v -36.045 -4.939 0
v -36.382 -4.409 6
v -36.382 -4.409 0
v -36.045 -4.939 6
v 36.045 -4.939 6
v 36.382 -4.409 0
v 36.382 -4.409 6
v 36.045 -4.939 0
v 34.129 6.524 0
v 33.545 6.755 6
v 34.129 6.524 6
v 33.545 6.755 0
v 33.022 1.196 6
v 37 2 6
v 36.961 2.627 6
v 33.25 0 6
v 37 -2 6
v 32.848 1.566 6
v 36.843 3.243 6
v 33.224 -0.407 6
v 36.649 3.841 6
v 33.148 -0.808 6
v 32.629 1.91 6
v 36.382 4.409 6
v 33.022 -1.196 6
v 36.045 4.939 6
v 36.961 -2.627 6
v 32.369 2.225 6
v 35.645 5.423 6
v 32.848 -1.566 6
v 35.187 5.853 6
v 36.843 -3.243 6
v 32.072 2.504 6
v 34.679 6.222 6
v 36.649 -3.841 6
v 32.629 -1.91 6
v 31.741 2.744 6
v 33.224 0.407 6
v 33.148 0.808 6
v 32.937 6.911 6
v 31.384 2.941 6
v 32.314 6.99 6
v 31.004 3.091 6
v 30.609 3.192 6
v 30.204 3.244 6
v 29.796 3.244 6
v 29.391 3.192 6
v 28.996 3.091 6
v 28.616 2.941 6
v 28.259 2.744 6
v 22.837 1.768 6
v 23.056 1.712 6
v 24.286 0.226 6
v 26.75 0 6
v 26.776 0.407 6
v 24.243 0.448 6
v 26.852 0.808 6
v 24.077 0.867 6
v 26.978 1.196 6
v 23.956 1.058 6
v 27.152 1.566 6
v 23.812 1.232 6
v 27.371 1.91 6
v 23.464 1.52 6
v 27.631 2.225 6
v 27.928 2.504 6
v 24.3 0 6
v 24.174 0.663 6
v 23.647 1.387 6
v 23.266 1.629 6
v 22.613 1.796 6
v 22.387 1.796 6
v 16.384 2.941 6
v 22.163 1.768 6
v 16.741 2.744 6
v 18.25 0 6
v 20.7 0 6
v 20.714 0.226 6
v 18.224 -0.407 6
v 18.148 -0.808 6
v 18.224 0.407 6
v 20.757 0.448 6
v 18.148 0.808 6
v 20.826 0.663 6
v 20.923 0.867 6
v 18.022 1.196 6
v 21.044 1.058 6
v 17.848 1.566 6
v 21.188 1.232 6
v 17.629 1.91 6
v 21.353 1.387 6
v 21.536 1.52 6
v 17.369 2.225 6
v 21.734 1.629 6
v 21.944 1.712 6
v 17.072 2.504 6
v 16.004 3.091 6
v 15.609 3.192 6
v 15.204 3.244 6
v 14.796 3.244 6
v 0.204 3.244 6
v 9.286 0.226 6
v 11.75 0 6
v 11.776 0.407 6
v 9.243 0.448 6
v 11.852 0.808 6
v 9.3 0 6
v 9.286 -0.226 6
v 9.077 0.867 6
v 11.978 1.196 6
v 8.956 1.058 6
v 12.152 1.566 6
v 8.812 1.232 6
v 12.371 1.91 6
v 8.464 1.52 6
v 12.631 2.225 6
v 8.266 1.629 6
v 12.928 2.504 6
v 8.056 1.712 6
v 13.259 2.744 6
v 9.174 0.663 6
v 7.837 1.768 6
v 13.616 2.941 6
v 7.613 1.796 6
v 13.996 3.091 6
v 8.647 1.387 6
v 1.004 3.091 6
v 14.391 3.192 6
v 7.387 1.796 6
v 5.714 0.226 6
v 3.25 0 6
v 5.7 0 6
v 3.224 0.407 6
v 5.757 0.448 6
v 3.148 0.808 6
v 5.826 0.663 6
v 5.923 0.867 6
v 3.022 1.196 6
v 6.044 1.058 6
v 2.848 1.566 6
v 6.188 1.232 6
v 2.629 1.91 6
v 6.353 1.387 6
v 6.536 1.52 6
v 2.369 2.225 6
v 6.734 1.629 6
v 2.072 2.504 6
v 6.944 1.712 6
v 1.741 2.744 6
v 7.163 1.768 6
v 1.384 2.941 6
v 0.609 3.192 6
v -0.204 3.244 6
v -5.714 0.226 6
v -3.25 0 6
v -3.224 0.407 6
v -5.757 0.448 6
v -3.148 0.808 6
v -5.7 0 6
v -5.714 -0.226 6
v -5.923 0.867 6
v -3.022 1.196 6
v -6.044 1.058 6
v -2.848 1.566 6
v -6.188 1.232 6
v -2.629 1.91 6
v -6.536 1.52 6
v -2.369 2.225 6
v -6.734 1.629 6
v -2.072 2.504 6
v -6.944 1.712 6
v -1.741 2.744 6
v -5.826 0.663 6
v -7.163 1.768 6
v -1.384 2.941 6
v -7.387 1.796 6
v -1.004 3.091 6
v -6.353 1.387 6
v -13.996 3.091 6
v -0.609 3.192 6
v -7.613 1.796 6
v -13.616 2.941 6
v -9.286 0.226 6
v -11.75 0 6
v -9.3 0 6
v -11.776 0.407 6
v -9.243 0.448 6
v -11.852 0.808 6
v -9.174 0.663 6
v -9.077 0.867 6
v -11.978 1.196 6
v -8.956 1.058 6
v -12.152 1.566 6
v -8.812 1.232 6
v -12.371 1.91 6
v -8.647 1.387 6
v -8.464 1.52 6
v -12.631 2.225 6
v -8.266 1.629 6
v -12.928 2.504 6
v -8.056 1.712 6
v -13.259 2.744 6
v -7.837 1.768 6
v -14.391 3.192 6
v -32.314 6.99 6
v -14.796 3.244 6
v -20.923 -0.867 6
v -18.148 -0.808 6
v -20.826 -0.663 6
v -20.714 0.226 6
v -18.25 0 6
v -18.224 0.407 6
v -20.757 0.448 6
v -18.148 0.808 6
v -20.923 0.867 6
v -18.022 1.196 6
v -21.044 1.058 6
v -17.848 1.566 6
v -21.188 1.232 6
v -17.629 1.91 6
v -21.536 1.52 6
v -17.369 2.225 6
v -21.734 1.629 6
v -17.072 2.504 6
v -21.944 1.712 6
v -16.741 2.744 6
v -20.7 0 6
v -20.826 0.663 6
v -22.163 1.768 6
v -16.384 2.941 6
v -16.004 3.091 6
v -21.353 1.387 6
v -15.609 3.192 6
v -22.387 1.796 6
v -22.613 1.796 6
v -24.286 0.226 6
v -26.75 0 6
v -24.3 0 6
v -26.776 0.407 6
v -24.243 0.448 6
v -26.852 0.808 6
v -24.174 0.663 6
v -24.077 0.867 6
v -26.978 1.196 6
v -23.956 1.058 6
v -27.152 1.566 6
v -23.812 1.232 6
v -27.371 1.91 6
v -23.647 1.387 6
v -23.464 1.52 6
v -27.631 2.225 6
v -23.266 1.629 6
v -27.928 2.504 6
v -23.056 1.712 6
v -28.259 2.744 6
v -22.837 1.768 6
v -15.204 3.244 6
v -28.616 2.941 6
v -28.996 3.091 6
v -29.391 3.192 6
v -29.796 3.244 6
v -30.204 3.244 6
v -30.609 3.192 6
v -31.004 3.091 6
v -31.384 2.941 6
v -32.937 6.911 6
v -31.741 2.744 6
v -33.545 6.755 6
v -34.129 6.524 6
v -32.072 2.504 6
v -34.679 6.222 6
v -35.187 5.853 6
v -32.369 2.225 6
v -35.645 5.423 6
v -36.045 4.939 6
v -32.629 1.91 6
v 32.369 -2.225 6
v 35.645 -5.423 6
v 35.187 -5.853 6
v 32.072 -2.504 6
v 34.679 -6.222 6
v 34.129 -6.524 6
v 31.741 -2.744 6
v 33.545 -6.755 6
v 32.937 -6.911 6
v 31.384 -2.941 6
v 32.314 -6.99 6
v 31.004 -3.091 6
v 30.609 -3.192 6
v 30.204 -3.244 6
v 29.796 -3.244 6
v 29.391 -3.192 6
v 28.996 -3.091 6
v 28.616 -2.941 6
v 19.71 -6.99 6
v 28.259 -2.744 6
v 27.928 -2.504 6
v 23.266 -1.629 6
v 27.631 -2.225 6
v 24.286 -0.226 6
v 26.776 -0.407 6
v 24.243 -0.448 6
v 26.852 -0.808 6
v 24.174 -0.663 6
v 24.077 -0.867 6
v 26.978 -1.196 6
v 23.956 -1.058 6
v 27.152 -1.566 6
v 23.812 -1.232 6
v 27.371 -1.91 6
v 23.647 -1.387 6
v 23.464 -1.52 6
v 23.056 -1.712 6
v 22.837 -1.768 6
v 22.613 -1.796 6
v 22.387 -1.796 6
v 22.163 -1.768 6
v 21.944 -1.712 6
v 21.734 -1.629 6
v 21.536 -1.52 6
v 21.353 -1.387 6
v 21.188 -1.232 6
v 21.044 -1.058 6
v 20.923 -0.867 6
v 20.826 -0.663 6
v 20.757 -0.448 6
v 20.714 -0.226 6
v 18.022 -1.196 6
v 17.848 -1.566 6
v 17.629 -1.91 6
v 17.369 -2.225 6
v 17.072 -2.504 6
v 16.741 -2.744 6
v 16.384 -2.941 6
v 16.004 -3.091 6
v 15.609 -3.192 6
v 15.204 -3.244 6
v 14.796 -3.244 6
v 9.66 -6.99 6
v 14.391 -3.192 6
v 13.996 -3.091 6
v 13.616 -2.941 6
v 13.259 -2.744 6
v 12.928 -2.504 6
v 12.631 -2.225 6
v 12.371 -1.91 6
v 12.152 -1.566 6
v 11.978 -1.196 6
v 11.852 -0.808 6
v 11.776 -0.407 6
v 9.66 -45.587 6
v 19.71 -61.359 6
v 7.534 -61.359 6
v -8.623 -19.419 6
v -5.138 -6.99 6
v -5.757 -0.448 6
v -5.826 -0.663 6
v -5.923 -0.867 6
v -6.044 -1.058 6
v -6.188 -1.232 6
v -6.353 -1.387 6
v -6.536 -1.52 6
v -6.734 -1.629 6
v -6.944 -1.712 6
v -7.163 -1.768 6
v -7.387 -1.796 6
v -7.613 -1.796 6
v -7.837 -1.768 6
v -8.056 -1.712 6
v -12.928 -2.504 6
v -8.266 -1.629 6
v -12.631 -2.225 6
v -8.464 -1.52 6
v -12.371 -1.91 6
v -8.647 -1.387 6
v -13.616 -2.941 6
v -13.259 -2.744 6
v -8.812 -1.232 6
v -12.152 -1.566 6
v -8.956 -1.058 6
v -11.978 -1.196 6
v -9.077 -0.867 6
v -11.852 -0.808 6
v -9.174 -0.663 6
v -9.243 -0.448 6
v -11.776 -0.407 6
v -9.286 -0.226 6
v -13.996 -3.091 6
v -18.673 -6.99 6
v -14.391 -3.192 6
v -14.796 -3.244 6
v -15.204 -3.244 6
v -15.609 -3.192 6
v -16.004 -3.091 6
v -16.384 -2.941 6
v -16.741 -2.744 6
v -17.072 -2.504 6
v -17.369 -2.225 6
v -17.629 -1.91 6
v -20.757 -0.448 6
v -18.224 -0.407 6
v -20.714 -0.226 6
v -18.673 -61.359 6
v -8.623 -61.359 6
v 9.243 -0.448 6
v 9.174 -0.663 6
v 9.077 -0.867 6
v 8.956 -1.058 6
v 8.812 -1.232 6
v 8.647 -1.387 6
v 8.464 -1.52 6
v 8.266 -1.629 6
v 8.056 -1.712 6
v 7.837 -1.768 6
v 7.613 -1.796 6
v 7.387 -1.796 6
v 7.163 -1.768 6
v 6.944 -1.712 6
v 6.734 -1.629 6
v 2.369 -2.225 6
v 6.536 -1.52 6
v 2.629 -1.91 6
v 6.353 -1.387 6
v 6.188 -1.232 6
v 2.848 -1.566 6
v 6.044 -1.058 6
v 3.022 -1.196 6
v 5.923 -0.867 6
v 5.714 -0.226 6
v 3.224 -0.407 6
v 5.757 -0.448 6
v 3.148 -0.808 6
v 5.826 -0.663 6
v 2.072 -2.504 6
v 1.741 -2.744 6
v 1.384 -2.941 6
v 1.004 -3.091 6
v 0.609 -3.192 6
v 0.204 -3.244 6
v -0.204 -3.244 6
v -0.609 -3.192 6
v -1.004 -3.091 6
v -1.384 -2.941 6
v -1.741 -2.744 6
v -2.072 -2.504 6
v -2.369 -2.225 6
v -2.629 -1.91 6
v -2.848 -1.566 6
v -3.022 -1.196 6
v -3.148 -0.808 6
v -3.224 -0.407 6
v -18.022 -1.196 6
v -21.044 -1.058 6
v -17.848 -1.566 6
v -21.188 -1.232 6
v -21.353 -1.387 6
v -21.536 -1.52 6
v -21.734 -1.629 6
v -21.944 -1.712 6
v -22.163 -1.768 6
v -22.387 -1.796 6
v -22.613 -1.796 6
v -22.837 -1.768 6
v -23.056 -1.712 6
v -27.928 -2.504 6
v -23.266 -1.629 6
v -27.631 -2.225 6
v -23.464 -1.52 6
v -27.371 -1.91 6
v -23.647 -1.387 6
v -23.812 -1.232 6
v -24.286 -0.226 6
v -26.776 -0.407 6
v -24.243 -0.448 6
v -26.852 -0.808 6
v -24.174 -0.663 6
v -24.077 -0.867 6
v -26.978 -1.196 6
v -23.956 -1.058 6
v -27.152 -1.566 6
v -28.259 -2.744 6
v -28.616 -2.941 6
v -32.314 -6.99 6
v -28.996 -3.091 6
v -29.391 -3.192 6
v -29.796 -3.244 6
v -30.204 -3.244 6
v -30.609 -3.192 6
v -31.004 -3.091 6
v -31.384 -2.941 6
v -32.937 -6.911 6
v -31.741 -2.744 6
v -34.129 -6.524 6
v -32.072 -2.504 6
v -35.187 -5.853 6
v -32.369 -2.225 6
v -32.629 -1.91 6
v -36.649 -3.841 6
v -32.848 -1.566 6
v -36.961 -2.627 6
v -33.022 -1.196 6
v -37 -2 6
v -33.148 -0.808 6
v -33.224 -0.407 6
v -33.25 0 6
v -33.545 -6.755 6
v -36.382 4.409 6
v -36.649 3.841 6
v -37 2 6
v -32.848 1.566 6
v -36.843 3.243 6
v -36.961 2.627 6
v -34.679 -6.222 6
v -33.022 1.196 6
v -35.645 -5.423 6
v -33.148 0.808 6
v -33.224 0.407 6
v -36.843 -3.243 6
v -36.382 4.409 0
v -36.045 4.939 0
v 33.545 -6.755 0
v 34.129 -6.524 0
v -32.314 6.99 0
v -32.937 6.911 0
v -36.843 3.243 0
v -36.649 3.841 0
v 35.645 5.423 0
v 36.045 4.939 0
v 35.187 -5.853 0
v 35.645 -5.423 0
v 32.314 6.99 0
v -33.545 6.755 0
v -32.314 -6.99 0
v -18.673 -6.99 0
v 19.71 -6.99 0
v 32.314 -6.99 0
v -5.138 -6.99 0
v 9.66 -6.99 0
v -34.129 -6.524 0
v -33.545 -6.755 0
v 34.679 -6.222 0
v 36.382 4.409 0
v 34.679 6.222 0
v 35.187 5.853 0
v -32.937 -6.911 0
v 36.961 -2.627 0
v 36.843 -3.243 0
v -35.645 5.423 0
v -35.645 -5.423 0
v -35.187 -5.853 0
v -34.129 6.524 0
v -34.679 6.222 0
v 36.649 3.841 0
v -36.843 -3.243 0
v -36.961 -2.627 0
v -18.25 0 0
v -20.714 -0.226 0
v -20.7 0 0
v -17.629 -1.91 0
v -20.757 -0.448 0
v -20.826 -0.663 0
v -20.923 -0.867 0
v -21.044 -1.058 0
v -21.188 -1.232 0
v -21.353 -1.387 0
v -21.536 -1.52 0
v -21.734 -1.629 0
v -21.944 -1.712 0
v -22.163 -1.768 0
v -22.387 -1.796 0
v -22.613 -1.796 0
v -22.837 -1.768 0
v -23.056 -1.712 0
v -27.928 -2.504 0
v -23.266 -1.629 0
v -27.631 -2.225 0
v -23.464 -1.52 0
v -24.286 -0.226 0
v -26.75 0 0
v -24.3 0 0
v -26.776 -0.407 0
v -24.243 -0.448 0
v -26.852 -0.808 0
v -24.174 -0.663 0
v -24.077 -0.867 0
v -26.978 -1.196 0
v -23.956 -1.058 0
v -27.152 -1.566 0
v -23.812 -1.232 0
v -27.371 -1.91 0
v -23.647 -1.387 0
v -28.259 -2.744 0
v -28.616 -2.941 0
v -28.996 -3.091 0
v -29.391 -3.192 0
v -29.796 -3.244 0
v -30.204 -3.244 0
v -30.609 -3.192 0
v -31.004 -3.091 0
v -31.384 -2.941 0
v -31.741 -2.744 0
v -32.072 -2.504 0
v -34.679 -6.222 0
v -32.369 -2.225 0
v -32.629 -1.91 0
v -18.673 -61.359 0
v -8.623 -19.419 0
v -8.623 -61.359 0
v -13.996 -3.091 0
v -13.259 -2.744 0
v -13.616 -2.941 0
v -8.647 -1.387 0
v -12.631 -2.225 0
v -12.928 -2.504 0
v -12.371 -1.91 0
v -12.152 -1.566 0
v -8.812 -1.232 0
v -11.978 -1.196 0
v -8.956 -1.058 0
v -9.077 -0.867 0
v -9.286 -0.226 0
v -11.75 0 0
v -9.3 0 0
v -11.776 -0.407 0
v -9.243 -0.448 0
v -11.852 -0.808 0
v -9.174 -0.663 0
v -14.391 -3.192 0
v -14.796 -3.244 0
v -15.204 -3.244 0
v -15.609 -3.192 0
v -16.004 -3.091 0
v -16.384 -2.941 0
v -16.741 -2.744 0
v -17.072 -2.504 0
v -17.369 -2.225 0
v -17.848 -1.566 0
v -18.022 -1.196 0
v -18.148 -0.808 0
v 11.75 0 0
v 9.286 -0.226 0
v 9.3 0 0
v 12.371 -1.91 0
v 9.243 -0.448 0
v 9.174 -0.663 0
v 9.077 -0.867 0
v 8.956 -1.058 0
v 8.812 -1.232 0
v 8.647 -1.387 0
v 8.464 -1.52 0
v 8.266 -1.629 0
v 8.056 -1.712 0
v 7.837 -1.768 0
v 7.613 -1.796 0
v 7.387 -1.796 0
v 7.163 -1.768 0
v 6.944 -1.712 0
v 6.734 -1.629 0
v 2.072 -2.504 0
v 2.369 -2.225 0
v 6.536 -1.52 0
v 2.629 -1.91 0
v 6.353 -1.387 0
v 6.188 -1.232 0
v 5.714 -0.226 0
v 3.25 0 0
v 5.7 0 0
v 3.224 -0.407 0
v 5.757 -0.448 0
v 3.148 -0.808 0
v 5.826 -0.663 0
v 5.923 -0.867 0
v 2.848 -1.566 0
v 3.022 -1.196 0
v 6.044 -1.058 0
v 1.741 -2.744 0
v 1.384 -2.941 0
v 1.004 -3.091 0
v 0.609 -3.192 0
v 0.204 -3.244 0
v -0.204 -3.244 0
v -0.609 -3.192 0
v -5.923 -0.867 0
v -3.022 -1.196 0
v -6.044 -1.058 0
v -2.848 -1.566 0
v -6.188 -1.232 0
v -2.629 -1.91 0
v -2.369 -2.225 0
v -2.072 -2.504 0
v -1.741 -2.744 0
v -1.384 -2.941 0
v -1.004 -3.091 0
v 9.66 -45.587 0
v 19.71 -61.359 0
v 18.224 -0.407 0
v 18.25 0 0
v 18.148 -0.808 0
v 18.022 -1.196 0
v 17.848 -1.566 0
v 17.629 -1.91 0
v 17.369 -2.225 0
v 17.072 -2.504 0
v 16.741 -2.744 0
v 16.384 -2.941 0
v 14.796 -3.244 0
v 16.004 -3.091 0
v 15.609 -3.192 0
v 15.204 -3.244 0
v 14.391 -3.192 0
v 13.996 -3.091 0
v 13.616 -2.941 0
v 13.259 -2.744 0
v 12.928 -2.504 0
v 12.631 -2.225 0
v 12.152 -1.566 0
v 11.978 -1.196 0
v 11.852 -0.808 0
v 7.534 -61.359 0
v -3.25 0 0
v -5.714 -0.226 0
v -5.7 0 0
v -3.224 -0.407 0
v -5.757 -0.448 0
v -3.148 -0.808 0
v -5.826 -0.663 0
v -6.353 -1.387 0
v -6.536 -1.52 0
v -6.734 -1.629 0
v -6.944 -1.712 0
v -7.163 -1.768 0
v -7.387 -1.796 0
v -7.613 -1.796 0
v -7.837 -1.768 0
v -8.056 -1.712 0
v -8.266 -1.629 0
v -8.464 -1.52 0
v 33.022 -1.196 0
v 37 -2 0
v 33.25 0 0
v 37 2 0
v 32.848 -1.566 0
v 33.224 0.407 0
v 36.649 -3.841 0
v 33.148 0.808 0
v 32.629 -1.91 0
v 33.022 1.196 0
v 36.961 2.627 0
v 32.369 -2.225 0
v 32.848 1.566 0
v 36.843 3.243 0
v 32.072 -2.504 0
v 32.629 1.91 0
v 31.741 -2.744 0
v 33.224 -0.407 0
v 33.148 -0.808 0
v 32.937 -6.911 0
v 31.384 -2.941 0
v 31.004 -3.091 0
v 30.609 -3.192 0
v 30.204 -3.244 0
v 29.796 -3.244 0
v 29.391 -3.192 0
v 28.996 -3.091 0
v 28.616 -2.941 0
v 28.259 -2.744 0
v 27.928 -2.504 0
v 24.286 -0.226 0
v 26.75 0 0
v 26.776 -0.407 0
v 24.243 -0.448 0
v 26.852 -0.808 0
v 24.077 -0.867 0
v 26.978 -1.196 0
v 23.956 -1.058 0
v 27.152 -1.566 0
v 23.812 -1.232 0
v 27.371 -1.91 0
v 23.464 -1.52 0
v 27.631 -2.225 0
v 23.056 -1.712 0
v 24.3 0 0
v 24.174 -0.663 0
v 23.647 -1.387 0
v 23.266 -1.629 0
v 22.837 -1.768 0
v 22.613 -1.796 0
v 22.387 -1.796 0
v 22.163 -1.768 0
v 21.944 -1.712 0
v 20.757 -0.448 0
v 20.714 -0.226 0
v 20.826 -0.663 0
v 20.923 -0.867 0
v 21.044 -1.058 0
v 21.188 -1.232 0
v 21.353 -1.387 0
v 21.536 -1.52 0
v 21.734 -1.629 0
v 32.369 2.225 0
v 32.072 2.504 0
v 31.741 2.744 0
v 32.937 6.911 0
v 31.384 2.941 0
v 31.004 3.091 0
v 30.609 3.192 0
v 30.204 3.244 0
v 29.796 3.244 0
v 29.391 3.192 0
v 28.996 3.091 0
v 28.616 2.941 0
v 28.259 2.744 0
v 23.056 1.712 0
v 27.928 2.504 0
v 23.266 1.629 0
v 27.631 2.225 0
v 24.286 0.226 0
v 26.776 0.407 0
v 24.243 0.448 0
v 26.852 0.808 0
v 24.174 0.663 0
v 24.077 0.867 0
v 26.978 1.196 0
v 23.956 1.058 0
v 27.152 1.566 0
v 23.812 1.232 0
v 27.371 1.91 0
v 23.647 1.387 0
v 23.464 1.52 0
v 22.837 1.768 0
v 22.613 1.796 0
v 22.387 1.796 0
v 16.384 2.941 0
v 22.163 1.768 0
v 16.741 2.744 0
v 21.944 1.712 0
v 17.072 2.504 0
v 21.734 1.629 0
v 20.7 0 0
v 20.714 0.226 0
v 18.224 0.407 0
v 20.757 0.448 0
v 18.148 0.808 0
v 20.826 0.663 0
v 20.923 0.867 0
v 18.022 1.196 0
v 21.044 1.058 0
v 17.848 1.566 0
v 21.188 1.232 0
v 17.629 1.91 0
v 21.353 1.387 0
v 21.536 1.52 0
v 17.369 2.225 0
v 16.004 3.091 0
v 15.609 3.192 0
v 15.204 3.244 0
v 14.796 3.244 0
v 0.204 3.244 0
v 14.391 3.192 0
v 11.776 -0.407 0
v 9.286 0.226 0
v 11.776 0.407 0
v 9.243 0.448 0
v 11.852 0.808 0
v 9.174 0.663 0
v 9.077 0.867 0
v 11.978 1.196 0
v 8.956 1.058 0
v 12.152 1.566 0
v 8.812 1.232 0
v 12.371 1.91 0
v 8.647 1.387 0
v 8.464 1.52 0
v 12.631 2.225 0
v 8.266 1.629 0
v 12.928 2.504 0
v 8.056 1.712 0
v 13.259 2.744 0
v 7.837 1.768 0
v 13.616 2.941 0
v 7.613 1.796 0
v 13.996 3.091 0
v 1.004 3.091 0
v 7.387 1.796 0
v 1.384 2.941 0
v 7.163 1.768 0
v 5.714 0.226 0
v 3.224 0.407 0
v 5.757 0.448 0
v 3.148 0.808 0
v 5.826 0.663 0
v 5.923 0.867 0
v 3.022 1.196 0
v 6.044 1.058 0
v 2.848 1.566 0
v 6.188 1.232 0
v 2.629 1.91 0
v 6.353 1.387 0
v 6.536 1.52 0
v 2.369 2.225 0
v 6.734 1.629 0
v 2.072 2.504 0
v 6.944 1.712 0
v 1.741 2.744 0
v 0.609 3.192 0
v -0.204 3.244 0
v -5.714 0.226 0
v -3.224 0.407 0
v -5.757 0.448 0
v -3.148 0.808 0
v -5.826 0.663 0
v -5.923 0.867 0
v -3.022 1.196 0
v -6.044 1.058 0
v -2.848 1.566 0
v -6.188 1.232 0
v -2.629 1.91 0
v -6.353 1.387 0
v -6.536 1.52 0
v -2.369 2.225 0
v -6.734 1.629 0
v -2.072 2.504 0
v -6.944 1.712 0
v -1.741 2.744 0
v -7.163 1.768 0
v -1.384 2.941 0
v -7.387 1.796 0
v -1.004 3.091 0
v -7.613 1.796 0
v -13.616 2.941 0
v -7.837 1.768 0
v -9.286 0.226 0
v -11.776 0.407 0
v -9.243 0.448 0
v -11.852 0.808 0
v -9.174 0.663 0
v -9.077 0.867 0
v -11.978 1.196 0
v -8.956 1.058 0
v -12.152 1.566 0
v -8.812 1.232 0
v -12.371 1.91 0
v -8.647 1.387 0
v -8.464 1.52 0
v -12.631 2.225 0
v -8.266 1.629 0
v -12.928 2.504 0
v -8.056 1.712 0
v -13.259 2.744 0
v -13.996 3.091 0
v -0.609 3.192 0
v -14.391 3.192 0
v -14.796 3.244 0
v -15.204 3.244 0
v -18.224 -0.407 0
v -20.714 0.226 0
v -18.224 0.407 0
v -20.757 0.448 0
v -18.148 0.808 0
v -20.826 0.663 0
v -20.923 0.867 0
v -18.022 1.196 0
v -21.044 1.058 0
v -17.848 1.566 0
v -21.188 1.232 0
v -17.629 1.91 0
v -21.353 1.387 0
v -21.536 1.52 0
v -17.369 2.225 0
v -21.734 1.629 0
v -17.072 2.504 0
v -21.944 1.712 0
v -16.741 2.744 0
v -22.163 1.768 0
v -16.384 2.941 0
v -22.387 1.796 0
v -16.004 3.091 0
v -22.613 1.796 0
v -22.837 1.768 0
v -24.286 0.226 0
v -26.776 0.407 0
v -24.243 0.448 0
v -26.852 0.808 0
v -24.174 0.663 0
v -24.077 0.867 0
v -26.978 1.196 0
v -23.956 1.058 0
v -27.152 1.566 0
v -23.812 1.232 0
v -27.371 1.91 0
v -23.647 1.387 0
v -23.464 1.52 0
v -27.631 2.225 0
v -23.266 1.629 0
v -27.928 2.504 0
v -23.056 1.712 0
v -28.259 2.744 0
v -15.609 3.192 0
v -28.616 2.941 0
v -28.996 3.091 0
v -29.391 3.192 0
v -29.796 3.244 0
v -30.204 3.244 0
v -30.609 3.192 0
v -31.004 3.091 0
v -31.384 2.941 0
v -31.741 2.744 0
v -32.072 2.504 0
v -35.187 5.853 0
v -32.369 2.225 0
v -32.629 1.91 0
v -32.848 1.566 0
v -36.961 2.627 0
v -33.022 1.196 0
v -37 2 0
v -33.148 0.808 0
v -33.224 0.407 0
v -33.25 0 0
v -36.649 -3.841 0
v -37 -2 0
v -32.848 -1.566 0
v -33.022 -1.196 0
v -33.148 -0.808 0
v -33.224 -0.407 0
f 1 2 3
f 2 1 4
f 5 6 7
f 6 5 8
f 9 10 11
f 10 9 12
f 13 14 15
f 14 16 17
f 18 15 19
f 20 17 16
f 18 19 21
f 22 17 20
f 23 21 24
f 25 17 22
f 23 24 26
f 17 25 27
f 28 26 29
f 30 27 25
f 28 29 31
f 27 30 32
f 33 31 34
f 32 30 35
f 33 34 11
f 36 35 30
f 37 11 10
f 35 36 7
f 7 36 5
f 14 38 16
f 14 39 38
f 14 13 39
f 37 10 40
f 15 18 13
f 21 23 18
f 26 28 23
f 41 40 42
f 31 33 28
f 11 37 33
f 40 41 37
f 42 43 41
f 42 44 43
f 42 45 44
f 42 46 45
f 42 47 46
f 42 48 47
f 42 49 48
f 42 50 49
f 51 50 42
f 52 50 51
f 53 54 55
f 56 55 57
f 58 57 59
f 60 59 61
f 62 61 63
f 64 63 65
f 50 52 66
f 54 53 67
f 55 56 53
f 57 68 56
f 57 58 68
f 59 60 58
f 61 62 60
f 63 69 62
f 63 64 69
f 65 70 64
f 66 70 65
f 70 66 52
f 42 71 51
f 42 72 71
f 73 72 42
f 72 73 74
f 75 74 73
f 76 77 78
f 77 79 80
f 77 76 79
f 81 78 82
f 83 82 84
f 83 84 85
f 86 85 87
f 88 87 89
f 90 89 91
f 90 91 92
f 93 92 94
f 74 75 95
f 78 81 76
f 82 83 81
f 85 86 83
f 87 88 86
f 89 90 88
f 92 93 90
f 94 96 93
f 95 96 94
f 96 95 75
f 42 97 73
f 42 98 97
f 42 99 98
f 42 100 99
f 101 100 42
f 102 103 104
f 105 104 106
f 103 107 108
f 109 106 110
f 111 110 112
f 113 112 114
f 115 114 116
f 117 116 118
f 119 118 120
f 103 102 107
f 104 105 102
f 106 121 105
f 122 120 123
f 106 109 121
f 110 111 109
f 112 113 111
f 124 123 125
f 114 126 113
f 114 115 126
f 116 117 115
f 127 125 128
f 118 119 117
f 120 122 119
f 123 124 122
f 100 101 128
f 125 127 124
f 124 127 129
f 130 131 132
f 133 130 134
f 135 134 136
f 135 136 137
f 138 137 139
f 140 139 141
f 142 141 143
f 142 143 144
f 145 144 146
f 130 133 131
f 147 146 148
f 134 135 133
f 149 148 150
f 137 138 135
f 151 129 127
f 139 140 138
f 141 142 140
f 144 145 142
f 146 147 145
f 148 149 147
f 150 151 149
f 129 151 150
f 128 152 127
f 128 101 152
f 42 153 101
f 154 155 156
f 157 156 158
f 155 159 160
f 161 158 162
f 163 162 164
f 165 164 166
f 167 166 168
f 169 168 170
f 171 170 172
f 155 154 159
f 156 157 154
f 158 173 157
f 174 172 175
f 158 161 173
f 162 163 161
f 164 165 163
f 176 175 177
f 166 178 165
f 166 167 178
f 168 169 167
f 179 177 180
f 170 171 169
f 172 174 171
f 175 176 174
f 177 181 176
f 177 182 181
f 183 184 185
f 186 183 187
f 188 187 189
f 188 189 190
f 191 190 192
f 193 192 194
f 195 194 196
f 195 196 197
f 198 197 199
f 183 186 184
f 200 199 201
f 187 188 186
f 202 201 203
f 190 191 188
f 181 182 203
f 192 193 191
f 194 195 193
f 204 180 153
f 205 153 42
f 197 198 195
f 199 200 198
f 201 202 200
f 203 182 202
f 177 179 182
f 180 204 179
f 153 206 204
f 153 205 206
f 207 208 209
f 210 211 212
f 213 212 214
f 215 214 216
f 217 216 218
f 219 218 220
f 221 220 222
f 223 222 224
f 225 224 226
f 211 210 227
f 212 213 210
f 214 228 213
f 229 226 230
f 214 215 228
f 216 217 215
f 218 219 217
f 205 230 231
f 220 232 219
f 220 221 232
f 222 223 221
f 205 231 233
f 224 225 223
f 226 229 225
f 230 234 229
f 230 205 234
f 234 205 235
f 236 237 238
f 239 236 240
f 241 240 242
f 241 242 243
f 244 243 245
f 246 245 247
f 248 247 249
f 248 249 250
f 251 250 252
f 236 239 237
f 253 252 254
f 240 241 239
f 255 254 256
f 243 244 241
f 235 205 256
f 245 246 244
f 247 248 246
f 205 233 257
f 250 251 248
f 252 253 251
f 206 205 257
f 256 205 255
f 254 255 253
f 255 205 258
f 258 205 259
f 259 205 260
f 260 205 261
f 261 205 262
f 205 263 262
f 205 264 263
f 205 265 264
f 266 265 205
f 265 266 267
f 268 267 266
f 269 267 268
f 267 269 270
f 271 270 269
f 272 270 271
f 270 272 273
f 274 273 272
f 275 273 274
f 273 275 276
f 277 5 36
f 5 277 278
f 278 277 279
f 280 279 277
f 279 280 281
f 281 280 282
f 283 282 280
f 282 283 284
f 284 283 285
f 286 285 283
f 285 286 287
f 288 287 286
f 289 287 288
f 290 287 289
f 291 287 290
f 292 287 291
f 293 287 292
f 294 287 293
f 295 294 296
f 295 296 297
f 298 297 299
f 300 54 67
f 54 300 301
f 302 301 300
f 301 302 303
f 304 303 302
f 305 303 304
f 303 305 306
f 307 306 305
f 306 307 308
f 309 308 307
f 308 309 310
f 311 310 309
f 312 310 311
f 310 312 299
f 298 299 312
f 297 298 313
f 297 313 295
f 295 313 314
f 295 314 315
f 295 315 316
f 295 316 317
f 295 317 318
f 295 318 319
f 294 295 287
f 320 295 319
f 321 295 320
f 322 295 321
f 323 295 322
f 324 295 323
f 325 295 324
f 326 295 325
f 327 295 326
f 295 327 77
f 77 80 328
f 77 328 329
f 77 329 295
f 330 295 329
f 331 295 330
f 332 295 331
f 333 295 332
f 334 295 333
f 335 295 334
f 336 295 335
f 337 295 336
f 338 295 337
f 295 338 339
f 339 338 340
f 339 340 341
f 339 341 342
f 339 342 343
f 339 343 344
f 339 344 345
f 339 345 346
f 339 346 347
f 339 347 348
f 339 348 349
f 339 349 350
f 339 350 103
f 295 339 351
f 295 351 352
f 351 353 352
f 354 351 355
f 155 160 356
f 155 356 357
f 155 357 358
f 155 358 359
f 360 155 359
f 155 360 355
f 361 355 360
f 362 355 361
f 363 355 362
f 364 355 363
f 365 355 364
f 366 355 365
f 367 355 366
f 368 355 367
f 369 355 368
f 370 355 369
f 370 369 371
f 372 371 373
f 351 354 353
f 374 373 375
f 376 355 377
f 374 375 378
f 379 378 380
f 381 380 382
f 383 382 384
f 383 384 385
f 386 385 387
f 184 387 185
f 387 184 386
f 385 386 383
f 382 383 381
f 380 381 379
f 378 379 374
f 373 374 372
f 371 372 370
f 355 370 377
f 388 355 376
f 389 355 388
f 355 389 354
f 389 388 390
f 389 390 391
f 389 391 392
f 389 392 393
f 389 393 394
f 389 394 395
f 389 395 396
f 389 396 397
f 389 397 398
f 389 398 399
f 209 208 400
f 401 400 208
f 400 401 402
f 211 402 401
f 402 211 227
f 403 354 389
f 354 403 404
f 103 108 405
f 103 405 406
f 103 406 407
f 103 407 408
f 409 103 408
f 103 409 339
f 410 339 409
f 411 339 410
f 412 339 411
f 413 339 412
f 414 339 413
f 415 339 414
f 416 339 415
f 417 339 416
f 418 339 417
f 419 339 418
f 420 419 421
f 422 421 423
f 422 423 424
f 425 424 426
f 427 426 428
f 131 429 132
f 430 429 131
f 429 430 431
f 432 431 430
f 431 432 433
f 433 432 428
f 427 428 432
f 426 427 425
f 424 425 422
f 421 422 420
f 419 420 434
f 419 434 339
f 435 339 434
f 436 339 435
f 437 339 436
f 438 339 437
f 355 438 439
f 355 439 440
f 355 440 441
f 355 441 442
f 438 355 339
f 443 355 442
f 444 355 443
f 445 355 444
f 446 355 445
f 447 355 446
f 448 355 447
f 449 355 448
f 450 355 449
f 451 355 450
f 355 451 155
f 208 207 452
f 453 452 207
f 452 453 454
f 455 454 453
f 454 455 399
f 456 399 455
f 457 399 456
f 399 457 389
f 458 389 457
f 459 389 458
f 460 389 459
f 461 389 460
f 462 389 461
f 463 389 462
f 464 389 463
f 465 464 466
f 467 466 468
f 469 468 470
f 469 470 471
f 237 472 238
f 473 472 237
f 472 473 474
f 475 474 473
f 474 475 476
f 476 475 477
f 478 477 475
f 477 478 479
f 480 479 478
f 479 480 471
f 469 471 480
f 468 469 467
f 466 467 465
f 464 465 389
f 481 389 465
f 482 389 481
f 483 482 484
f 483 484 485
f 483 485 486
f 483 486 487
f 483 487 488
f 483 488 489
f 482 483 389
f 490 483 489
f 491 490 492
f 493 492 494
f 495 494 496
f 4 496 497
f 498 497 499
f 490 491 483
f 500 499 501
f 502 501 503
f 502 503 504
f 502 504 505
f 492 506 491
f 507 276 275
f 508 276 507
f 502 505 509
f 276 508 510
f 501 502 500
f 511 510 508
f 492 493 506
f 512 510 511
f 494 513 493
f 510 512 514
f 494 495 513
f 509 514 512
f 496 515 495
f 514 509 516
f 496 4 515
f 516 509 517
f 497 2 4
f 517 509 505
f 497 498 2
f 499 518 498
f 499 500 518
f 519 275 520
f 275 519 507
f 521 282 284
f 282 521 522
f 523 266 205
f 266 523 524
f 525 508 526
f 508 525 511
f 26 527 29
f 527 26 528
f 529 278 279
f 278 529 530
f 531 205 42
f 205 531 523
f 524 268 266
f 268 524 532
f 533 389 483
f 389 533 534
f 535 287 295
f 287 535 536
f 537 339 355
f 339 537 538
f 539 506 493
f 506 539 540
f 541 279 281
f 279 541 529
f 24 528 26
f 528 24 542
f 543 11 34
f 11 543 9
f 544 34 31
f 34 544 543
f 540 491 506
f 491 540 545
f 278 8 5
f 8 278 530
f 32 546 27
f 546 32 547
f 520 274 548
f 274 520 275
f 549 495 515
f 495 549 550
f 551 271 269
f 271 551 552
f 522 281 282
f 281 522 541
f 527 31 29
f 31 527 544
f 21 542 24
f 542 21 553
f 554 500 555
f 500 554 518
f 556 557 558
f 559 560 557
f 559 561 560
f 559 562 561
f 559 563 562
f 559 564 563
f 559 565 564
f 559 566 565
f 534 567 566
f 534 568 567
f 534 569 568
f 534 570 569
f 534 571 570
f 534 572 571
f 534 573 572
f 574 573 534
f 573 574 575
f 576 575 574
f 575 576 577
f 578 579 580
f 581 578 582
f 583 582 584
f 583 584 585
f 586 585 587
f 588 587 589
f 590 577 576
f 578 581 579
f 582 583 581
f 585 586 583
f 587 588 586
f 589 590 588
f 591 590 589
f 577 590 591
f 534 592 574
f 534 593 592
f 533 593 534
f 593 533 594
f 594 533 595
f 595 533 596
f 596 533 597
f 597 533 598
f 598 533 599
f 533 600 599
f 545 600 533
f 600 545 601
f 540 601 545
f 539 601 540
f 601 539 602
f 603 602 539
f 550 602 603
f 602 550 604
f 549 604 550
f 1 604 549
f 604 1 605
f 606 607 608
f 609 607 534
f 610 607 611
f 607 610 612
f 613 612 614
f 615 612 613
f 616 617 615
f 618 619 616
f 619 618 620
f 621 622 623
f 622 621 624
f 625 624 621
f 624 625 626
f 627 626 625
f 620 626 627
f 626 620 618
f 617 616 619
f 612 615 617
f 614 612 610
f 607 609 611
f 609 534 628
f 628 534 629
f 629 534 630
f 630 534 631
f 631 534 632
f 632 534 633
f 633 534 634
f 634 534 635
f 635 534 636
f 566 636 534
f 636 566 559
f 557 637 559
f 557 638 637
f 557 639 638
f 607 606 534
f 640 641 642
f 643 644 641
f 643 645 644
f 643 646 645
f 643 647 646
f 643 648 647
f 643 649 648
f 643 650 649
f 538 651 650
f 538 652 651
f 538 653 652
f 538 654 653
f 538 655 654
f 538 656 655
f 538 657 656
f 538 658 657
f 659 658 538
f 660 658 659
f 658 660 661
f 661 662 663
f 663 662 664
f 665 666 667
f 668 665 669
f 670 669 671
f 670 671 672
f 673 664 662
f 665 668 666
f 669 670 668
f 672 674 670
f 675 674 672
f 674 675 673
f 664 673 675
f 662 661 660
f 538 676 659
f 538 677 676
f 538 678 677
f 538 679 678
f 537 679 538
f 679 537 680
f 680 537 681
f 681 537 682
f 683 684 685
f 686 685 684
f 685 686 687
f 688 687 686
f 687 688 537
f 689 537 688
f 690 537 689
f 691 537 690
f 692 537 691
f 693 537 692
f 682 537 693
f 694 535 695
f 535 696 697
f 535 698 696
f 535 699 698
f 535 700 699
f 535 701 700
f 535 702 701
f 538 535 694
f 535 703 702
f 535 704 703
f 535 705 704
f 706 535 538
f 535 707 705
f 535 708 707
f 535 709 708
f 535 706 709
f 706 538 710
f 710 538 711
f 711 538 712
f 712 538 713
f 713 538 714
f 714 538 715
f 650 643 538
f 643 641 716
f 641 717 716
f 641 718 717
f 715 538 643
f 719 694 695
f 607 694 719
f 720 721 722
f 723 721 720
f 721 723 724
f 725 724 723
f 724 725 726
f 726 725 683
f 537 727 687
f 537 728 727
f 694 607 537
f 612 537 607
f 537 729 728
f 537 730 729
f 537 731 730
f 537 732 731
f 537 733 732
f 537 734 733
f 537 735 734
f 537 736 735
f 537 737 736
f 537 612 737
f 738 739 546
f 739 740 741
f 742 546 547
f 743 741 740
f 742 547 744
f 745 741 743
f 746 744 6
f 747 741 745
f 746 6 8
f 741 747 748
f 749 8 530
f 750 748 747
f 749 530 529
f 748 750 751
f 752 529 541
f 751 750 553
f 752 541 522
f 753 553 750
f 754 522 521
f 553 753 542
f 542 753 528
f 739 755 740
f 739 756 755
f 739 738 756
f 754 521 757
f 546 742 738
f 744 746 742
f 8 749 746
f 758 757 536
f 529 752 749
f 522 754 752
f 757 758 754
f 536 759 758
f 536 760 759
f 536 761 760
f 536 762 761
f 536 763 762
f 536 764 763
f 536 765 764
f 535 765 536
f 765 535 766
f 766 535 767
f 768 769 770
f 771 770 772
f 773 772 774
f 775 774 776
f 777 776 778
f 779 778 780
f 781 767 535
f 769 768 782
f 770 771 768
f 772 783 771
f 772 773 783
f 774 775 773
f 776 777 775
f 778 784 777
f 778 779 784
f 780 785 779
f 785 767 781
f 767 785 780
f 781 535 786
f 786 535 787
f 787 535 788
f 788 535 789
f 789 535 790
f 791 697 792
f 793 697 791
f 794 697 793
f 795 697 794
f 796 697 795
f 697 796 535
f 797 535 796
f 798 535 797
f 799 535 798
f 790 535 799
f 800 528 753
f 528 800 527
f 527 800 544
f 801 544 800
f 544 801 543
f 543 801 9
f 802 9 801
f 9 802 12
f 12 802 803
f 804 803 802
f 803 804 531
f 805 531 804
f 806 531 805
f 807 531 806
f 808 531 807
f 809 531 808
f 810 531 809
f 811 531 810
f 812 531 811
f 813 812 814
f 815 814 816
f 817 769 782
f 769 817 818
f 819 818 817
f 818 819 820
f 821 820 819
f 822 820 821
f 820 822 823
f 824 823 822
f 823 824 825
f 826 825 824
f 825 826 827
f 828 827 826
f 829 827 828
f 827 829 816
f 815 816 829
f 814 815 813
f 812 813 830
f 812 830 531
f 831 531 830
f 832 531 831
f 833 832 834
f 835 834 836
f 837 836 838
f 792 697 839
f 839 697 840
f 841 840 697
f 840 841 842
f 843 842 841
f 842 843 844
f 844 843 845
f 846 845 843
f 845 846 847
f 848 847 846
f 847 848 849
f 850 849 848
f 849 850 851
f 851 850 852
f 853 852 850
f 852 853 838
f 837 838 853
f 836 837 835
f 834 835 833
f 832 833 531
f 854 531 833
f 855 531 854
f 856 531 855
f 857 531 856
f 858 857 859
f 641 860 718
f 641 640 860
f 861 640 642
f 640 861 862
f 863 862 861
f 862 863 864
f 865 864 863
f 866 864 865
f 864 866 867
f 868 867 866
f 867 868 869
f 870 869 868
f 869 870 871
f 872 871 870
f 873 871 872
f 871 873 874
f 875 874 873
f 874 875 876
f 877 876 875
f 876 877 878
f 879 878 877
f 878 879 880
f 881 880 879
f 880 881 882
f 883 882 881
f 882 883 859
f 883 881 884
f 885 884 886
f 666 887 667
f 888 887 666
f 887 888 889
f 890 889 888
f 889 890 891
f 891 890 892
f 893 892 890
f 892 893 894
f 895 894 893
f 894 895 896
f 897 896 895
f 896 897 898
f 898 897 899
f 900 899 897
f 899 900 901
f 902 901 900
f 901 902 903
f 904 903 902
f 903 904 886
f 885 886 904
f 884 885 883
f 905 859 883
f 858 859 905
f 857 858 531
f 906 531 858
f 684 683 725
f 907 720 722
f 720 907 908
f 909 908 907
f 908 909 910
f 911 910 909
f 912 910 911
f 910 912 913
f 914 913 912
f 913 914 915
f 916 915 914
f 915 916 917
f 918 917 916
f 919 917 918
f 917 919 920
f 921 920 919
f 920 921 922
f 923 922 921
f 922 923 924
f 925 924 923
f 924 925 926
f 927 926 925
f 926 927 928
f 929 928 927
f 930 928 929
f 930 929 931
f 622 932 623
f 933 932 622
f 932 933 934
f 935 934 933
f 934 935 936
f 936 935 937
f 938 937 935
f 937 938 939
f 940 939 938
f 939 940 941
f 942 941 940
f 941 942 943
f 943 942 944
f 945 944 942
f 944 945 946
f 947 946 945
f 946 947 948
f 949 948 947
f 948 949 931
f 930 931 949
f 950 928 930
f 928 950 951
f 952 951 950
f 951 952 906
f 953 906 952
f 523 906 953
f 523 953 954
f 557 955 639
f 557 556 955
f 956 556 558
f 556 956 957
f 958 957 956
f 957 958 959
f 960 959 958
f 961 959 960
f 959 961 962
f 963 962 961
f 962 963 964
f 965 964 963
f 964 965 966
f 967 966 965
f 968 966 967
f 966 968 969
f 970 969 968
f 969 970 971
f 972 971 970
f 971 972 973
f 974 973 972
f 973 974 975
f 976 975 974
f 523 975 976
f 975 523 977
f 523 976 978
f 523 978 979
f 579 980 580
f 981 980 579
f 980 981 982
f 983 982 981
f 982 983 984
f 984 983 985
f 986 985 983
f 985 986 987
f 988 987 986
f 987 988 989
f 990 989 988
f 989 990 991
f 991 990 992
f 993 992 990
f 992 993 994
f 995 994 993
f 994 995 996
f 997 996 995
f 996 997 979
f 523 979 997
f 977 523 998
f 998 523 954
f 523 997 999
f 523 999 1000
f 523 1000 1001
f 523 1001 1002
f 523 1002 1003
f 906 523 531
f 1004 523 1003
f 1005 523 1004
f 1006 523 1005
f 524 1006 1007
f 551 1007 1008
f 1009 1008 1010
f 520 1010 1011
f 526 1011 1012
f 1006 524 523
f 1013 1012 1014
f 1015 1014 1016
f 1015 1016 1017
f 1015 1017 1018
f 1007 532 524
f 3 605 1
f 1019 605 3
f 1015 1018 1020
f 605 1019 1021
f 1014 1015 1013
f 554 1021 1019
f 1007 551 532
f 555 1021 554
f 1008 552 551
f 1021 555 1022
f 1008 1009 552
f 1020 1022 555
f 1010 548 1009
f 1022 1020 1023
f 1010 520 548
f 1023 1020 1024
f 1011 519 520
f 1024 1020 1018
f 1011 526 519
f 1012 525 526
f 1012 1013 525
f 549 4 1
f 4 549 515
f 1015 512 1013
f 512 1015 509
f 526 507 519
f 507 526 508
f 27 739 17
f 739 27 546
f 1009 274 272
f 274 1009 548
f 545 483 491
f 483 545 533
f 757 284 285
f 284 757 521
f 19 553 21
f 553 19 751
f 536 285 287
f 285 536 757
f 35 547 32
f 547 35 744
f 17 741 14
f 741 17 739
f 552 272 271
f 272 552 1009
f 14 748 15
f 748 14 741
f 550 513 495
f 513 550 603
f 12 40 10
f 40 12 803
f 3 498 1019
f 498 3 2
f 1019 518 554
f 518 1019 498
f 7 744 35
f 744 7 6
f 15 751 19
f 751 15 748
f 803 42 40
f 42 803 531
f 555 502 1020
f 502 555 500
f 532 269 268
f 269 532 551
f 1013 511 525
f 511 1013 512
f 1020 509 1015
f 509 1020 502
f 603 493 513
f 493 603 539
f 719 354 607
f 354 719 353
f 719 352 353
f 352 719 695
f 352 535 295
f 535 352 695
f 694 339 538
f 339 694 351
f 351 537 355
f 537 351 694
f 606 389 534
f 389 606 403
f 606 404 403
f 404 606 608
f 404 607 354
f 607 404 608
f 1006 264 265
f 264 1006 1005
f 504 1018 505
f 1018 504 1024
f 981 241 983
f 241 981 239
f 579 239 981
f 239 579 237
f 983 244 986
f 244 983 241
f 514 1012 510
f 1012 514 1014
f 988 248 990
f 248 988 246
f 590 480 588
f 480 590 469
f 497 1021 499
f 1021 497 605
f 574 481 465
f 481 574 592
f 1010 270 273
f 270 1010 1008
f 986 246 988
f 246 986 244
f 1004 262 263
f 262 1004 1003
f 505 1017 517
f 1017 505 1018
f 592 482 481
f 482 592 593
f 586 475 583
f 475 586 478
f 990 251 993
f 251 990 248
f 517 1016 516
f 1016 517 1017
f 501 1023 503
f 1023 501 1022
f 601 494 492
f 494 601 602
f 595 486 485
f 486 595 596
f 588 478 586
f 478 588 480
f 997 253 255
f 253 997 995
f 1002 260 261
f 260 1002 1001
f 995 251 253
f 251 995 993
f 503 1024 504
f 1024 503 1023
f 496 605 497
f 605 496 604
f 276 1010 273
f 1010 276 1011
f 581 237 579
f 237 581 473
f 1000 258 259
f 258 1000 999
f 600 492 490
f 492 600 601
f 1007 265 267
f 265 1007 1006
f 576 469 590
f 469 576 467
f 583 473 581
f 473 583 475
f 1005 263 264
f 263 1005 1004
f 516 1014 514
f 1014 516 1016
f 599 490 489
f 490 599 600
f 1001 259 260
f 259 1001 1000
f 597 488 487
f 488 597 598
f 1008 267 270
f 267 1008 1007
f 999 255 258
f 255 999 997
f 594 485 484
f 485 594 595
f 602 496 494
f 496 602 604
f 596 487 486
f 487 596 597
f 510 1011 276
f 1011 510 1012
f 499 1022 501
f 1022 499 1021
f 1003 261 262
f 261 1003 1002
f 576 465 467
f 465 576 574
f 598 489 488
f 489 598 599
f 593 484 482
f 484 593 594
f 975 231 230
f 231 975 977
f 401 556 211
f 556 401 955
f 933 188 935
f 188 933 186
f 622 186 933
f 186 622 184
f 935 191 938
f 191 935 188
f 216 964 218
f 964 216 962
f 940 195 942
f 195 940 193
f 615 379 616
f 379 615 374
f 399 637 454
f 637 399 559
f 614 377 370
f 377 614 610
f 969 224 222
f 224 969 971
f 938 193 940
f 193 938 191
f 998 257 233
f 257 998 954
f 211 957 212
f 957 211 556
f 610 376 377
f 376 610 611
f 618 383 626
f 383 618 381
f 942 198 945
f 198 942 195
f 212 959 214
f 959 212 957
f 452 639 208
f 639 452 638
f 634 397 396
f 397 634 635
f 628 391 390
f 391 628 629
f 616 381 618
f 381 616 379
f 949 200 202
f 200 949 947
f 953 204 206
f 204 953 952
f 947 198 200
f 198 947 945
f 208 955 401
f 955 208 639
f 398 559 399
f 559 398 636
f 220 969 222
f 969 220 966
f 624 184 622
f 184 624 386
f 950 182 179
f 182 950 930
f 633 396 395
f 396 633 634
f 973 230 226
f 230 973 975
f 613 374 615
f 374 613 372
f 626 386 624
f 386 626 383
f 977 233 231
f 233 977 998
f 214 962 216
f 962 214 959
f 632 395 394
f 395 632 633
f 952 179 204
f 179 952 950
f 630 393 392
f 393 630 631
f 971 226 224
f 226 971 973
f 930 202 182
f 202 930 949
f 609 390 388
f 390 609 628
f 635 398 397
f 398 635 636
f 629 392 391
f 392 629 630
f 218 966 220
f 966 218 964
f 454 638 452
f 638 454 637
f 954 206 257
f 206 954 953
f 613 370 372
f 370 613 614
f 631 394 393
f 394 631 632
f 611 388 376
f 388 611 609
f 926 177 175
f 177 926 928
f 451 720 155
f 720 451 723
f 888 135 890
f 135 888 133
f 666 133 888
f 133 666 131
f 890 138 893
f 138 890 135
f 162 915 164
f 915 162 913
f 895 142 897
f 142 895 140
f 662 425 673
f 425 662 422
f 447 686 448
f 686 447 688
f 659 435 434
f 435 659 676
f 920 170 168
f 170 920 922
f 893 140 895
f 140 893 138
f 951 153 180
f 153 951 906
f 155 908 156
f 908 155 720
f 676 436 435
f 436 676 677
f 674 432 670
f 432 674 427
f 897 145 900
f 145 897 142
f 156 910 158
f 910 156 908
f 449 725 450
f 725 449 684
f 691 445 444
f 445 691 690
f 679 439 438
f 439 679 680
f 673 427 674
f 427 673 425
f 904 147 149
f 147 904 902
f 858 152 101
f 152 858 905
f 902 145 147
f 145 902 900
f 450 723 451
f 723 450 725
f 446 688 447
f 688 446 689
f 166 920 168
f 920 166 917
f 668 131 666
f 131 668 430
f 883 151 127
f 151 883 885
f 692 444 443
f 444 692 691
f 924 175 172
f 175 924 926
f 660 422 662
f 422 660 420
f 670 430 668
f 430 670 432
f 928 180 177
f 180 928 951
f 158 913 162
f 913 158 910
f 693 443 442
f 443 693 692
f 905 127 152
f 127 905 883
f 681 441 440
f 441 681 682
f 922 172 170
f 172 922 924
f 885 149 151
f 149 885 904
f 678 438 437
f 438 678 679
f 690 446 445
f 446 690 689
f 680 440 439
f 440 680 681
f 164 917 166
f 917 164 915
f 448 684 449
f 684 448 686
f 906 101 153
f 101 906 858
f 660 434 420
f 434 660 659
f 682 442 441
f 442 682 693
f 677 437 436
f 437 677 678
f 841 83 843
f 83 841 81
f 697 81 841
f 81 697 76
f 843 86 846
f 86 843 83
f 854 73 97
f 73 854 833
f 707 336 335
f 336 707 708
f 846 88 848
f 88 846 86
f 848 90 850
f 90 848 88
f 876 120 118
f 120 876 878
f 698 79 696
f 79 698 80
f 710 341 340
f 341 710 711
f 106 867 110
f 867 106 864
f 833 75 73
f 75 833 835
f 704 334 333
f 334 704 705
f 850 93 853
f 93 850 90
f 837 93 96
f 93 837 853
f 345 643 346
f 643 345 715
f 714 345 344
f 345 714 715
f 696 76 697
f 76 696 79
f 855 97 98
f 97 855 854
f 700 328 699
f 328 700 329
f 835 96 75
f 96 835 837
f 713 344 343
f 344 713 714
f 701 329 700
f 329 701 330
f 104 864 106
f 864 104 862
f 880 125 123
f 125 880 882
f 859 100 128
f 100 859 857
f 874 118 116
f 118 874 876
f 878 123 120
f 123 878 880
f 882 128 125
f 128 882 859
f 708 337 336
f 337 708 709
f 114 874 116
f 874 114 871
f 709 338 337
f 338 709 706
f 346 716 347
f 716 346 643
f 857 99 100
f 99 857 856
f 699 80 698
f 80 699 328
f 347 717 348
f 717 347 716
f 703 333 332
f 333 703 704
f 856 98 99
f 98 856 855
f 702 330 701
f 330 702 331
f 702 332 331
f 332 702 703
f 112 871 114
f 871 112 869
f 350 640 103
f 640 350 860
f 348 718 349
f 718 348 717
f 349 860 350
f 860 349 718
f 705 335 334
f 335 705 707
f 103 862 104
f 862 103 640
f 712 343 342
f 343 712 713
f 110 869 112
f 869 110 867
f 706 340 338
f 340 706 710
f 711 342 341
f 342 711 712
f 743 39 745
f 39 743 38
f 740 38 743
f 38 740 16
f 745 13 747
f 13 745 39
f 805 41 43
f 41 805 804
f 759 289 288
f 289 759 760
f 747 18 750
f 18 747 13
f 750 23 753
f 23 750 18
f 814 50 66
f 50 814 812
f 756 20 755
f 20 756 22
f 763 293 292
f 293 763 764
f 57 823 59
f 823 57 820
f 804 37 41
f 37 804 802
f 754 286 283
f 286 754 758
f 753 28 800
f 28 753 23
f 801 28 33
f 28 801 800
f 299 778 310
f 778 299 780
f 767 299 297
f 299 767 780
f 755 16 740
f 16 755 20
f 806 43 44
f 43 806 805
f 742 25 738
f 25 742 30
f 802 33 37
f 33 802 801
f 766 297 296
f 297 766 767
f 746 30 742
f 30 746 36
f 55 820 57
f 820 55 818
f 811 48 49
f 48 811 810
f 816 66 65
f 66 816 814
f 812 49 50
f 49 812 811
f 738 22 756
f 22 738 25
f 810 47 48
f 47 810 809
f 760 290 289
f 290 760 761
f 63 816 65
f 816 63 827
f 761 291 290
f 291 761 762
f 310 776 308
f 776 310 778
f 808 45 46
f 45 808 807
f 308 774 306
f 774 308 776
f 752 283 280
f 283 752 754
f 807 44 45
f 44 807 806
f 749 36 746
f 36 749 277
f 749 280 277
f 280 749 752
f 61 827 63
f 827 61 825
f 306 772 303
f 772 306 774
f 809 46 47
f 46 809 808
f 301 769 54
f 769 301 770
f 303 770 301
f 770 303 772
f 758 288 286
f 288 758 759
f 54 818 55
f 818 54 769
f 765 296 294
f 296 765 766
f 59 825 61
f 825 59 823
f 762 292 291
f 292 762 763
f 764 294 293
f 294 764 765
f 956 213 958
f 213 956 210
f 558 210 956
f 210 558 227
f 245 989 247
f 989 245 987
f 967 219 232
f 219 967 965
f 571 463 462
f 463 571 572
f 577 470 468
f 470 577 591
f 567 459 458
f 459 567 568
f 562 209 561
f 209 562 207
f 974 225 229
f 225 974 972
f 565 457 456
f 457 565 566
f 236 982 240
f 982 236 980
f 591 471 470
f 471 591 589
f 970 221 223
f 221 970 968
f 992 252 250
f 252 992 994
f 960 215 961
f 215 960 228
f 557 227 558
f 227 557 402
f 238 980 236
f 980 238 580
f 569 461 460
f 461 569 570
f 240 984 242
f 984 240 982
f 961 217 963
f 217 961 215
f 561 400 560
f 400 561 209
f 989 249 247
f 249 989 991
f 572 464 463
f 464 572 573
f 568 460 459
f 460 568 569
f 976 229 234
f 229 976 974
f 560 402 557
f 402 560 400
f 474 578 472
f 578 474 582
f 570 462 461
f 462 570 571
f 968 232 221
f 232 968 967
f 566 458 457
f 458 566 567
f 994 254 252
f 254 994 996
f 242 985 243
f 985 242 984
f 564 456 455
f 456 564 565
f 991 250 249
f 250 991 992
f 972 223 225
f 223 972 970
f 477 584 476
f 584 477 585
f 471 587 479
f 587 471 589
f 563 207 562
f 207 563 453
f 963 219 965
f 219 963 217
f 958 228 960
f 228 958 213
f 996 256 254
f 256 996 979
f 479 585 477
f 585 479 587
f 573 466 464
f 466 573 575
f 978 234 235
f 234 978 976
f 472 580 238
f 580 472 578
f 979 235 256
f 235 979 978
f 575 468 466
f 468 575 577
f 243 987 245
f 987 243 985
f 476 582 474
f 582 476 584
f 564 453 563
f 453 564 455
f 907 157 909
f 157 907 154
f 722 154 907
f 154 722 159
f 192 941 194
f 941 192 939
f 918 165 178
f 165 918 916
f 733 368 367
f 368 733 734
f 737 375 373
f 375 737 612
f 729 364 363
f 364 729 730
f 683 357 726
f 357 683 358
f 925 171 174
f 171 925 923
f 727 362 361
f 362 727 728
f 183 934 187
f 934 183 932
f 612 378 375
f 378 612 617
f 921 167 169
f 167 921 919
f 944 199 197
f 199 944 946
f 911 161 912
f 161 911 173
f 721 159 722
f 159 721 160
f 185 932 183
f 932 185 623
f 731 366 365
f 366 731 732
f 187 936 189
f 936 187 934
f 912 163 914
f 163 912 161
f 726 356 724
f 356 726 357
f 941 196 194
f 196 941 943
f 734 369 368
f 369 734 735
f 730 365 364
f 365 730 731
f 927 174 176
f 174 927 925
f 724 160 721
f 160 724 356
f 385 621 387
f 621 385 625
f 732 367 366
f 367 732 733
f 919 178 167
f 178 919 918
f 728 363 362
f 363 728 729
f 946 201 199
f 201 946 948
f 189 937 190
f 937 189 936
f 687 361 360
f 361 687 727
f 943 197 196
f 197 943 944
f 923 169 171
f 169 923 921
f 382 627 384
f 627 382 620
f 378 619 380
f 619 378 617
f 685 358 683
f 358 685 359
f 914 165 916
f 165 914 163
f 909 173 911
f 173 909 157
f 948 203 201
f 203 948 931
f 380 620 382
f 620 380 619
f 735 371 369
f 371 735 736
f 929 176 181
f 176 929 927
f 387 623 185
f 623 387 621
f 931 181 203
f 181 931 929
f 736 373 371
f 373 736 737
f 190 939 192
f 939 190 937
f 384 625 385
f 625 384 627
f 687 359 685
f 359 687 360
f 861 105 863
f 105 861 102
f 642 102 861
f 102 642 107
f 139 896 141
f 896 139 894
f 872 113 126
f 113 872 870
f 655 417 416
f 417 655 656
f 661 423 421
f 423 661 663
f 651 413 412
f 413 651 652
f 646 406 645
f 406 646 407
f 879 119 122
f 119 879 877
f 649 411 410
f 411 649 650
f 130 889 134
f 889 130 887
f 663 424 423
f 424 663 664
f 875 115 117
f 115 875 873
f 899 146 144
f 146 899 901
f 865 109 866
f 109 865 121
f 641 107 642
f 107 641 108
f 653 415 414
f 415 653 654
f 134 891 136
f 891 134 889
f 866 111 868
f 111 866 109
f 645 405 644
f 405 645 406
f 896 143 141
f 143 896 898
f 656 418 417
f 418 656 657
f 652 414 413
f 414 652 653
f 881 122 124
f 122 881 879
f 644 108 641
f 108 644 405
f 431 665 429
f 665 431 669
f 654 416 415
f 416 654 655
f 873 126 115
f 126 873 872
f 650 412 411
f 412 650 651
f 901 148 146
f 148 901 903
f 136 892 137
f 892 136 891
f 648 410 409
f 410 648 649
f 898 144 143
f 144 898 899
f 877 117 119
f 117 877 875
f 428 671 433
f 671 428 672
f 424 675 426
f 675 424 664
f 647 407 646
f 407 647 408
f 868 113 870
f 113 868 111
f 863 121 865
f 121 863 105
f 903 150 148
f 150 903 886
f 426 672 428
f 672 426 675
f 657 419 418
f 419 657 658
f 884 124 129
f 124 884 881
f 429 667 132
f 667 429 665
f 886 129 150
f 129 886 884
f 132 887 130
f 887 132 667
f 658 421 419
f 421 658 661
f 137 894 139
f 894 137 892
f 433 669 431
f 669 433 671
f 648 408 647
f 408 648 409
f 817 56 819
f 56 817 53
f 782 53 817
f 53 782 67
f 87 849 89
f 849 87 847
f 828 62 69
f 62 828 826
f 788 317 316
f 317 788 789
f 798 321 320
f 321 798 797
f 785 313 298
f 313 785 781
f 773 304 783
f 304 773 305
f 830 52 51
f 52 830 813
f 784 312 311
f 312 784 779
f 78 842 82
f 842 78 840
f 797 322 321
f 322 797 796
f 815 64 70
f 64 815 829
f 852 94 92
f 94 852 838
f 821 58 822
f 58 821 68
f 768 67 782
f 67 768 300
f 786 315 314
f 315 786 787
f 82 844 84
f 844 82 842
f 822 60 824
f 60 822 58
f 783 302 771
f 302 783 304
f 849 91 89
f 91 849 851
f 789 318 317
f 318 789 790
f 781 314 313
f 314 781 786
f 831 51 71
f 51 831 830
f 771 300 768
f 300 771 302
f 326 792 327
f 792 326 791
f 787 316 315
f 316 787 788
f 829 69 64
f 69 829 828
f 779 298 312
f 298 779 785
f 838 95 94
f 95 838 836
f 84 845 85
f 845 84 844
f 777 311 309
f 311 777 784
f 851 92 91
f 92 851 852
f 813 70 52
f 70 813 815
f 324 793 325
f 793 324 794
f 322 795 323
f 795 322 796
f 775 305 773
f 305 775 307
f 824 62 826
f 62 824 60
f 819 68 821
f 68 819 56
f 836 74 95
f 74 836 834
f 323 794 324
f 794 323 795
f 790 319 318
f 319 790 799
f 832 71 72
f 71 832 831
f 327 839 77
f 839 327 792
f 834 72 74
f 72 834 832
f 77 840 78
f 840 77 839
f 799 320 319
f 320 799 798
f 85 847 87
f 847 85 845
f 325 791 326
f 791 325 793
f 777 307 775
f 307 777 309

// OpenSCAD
$fn = 50;


difference() {
	union() {
		hull() {
			translate(v = [-32.0000000000, 2.0000000000, 0]) {
				cylinder(h = 6, r = 5);
			}
			translate(v = [32.0000000000, 2.0000000000, 0]) {
				cylinder(h = 6, r = 5);
			}
			translate(v = [-32.0000000000, -2.0000000000, 0]) {
				cylinder(h = 6, r = 5);
			}
			translate(v = [32.0000000000, -2.0000000000, 0]) {
				cylinder(h = 6, r = 5);
			}
		}
		translate(v = [0, -5, 0]) {
			linear_extrude(height = 6) {
				text(font = "DejaVu Sans Mono:style=Bold", halign = "center", size = 57.0000000000, text = "N", valign = "top");
			}
		}
	}
	union() {
		translate(v = [-30.0000000000, 0.0000000000, 0]) {
			translate(v = [0, 0, -100]) {
				cylinder(h = 200, r = 3.2500000000);
			}
		}
		translate(v = [-15.0000000000, 0.0000000000, 0]) {
			translate(v = [0, 0, -100]) {
				cylinder(h = 200, r = 3.2500000000);
			}
		}
		translate(v = [0, 0, -100]) {
			cylinder(h = 200, r = 3.2500000000);
		}
		translate(v = [15.0000000000, 0.0000000000, 0]) {
			translate(v = [0, 0, -100]) {
				cylinder(h = 200, r = 3.2500000000);
			}
		}
		translate(v = [30.0000000000, 0.0000000000, 0]) {
			translate(v = [0, 0, -100]) {
				cylinder(h = 200, r = 3.2500000000);
			}
		}
		translate(v = [-30.0000000000, 0.0000000000, 0]) {
			translate(v = [0, 0, -100]) {
				cylinder(h = 200, r = 1.8000000000);
			}
		}
		translate(v = [-22.5000000000, 0.0000000000, 0]) {
			translate(v = [0, 0, -100]) {
				cylinder(h = 200, r = 1.8000000000);
			}
		}
		translate(v = [-15.0000000000, 0.0000000000, 0]) {
			translate(v = [0, 0, -100]) {
				cylinder(h = 200, r = 1.8000000000);
			}
		}
		translate(v = [-7.5000000000, 0.0000000000, 0]) {
			translate(v = [0, 0, -100]) {
				cylinder(h = 200, r = 1.8000000000);
			}
		}
		translate(v = [0, 0, -100]) {
			cylinder(h = 200, r = 1.8000000000);
		}
		translate(v = [7.5000000000, 0.0000000000, 0]) {
			translate(v = [0, 0, -100]) {
				cylinder(h = 200, r = 1.8000000000);
			}
		}
		translate(v = [15.0000000000, 0.0000000000, 0]) {
			translate(v = [0, 0, -100]) {
				cylinder(h = 200, r = 1.8000000000);
			}
		}
		translate(v = [22.5000000000, 0.0000000000, 0]) {
			translate(v = [0, 0, -100]) {
				cylinder(h = 200, r = 1.8000000000);
			}
		}
		translate(v = [30.0000000000, 0.0000000000, 0]) {
			translate(v = [0, 0, -100]) {
				cylinder(h = 200, r = 1.8000000000);
			}
		}
	}
}
